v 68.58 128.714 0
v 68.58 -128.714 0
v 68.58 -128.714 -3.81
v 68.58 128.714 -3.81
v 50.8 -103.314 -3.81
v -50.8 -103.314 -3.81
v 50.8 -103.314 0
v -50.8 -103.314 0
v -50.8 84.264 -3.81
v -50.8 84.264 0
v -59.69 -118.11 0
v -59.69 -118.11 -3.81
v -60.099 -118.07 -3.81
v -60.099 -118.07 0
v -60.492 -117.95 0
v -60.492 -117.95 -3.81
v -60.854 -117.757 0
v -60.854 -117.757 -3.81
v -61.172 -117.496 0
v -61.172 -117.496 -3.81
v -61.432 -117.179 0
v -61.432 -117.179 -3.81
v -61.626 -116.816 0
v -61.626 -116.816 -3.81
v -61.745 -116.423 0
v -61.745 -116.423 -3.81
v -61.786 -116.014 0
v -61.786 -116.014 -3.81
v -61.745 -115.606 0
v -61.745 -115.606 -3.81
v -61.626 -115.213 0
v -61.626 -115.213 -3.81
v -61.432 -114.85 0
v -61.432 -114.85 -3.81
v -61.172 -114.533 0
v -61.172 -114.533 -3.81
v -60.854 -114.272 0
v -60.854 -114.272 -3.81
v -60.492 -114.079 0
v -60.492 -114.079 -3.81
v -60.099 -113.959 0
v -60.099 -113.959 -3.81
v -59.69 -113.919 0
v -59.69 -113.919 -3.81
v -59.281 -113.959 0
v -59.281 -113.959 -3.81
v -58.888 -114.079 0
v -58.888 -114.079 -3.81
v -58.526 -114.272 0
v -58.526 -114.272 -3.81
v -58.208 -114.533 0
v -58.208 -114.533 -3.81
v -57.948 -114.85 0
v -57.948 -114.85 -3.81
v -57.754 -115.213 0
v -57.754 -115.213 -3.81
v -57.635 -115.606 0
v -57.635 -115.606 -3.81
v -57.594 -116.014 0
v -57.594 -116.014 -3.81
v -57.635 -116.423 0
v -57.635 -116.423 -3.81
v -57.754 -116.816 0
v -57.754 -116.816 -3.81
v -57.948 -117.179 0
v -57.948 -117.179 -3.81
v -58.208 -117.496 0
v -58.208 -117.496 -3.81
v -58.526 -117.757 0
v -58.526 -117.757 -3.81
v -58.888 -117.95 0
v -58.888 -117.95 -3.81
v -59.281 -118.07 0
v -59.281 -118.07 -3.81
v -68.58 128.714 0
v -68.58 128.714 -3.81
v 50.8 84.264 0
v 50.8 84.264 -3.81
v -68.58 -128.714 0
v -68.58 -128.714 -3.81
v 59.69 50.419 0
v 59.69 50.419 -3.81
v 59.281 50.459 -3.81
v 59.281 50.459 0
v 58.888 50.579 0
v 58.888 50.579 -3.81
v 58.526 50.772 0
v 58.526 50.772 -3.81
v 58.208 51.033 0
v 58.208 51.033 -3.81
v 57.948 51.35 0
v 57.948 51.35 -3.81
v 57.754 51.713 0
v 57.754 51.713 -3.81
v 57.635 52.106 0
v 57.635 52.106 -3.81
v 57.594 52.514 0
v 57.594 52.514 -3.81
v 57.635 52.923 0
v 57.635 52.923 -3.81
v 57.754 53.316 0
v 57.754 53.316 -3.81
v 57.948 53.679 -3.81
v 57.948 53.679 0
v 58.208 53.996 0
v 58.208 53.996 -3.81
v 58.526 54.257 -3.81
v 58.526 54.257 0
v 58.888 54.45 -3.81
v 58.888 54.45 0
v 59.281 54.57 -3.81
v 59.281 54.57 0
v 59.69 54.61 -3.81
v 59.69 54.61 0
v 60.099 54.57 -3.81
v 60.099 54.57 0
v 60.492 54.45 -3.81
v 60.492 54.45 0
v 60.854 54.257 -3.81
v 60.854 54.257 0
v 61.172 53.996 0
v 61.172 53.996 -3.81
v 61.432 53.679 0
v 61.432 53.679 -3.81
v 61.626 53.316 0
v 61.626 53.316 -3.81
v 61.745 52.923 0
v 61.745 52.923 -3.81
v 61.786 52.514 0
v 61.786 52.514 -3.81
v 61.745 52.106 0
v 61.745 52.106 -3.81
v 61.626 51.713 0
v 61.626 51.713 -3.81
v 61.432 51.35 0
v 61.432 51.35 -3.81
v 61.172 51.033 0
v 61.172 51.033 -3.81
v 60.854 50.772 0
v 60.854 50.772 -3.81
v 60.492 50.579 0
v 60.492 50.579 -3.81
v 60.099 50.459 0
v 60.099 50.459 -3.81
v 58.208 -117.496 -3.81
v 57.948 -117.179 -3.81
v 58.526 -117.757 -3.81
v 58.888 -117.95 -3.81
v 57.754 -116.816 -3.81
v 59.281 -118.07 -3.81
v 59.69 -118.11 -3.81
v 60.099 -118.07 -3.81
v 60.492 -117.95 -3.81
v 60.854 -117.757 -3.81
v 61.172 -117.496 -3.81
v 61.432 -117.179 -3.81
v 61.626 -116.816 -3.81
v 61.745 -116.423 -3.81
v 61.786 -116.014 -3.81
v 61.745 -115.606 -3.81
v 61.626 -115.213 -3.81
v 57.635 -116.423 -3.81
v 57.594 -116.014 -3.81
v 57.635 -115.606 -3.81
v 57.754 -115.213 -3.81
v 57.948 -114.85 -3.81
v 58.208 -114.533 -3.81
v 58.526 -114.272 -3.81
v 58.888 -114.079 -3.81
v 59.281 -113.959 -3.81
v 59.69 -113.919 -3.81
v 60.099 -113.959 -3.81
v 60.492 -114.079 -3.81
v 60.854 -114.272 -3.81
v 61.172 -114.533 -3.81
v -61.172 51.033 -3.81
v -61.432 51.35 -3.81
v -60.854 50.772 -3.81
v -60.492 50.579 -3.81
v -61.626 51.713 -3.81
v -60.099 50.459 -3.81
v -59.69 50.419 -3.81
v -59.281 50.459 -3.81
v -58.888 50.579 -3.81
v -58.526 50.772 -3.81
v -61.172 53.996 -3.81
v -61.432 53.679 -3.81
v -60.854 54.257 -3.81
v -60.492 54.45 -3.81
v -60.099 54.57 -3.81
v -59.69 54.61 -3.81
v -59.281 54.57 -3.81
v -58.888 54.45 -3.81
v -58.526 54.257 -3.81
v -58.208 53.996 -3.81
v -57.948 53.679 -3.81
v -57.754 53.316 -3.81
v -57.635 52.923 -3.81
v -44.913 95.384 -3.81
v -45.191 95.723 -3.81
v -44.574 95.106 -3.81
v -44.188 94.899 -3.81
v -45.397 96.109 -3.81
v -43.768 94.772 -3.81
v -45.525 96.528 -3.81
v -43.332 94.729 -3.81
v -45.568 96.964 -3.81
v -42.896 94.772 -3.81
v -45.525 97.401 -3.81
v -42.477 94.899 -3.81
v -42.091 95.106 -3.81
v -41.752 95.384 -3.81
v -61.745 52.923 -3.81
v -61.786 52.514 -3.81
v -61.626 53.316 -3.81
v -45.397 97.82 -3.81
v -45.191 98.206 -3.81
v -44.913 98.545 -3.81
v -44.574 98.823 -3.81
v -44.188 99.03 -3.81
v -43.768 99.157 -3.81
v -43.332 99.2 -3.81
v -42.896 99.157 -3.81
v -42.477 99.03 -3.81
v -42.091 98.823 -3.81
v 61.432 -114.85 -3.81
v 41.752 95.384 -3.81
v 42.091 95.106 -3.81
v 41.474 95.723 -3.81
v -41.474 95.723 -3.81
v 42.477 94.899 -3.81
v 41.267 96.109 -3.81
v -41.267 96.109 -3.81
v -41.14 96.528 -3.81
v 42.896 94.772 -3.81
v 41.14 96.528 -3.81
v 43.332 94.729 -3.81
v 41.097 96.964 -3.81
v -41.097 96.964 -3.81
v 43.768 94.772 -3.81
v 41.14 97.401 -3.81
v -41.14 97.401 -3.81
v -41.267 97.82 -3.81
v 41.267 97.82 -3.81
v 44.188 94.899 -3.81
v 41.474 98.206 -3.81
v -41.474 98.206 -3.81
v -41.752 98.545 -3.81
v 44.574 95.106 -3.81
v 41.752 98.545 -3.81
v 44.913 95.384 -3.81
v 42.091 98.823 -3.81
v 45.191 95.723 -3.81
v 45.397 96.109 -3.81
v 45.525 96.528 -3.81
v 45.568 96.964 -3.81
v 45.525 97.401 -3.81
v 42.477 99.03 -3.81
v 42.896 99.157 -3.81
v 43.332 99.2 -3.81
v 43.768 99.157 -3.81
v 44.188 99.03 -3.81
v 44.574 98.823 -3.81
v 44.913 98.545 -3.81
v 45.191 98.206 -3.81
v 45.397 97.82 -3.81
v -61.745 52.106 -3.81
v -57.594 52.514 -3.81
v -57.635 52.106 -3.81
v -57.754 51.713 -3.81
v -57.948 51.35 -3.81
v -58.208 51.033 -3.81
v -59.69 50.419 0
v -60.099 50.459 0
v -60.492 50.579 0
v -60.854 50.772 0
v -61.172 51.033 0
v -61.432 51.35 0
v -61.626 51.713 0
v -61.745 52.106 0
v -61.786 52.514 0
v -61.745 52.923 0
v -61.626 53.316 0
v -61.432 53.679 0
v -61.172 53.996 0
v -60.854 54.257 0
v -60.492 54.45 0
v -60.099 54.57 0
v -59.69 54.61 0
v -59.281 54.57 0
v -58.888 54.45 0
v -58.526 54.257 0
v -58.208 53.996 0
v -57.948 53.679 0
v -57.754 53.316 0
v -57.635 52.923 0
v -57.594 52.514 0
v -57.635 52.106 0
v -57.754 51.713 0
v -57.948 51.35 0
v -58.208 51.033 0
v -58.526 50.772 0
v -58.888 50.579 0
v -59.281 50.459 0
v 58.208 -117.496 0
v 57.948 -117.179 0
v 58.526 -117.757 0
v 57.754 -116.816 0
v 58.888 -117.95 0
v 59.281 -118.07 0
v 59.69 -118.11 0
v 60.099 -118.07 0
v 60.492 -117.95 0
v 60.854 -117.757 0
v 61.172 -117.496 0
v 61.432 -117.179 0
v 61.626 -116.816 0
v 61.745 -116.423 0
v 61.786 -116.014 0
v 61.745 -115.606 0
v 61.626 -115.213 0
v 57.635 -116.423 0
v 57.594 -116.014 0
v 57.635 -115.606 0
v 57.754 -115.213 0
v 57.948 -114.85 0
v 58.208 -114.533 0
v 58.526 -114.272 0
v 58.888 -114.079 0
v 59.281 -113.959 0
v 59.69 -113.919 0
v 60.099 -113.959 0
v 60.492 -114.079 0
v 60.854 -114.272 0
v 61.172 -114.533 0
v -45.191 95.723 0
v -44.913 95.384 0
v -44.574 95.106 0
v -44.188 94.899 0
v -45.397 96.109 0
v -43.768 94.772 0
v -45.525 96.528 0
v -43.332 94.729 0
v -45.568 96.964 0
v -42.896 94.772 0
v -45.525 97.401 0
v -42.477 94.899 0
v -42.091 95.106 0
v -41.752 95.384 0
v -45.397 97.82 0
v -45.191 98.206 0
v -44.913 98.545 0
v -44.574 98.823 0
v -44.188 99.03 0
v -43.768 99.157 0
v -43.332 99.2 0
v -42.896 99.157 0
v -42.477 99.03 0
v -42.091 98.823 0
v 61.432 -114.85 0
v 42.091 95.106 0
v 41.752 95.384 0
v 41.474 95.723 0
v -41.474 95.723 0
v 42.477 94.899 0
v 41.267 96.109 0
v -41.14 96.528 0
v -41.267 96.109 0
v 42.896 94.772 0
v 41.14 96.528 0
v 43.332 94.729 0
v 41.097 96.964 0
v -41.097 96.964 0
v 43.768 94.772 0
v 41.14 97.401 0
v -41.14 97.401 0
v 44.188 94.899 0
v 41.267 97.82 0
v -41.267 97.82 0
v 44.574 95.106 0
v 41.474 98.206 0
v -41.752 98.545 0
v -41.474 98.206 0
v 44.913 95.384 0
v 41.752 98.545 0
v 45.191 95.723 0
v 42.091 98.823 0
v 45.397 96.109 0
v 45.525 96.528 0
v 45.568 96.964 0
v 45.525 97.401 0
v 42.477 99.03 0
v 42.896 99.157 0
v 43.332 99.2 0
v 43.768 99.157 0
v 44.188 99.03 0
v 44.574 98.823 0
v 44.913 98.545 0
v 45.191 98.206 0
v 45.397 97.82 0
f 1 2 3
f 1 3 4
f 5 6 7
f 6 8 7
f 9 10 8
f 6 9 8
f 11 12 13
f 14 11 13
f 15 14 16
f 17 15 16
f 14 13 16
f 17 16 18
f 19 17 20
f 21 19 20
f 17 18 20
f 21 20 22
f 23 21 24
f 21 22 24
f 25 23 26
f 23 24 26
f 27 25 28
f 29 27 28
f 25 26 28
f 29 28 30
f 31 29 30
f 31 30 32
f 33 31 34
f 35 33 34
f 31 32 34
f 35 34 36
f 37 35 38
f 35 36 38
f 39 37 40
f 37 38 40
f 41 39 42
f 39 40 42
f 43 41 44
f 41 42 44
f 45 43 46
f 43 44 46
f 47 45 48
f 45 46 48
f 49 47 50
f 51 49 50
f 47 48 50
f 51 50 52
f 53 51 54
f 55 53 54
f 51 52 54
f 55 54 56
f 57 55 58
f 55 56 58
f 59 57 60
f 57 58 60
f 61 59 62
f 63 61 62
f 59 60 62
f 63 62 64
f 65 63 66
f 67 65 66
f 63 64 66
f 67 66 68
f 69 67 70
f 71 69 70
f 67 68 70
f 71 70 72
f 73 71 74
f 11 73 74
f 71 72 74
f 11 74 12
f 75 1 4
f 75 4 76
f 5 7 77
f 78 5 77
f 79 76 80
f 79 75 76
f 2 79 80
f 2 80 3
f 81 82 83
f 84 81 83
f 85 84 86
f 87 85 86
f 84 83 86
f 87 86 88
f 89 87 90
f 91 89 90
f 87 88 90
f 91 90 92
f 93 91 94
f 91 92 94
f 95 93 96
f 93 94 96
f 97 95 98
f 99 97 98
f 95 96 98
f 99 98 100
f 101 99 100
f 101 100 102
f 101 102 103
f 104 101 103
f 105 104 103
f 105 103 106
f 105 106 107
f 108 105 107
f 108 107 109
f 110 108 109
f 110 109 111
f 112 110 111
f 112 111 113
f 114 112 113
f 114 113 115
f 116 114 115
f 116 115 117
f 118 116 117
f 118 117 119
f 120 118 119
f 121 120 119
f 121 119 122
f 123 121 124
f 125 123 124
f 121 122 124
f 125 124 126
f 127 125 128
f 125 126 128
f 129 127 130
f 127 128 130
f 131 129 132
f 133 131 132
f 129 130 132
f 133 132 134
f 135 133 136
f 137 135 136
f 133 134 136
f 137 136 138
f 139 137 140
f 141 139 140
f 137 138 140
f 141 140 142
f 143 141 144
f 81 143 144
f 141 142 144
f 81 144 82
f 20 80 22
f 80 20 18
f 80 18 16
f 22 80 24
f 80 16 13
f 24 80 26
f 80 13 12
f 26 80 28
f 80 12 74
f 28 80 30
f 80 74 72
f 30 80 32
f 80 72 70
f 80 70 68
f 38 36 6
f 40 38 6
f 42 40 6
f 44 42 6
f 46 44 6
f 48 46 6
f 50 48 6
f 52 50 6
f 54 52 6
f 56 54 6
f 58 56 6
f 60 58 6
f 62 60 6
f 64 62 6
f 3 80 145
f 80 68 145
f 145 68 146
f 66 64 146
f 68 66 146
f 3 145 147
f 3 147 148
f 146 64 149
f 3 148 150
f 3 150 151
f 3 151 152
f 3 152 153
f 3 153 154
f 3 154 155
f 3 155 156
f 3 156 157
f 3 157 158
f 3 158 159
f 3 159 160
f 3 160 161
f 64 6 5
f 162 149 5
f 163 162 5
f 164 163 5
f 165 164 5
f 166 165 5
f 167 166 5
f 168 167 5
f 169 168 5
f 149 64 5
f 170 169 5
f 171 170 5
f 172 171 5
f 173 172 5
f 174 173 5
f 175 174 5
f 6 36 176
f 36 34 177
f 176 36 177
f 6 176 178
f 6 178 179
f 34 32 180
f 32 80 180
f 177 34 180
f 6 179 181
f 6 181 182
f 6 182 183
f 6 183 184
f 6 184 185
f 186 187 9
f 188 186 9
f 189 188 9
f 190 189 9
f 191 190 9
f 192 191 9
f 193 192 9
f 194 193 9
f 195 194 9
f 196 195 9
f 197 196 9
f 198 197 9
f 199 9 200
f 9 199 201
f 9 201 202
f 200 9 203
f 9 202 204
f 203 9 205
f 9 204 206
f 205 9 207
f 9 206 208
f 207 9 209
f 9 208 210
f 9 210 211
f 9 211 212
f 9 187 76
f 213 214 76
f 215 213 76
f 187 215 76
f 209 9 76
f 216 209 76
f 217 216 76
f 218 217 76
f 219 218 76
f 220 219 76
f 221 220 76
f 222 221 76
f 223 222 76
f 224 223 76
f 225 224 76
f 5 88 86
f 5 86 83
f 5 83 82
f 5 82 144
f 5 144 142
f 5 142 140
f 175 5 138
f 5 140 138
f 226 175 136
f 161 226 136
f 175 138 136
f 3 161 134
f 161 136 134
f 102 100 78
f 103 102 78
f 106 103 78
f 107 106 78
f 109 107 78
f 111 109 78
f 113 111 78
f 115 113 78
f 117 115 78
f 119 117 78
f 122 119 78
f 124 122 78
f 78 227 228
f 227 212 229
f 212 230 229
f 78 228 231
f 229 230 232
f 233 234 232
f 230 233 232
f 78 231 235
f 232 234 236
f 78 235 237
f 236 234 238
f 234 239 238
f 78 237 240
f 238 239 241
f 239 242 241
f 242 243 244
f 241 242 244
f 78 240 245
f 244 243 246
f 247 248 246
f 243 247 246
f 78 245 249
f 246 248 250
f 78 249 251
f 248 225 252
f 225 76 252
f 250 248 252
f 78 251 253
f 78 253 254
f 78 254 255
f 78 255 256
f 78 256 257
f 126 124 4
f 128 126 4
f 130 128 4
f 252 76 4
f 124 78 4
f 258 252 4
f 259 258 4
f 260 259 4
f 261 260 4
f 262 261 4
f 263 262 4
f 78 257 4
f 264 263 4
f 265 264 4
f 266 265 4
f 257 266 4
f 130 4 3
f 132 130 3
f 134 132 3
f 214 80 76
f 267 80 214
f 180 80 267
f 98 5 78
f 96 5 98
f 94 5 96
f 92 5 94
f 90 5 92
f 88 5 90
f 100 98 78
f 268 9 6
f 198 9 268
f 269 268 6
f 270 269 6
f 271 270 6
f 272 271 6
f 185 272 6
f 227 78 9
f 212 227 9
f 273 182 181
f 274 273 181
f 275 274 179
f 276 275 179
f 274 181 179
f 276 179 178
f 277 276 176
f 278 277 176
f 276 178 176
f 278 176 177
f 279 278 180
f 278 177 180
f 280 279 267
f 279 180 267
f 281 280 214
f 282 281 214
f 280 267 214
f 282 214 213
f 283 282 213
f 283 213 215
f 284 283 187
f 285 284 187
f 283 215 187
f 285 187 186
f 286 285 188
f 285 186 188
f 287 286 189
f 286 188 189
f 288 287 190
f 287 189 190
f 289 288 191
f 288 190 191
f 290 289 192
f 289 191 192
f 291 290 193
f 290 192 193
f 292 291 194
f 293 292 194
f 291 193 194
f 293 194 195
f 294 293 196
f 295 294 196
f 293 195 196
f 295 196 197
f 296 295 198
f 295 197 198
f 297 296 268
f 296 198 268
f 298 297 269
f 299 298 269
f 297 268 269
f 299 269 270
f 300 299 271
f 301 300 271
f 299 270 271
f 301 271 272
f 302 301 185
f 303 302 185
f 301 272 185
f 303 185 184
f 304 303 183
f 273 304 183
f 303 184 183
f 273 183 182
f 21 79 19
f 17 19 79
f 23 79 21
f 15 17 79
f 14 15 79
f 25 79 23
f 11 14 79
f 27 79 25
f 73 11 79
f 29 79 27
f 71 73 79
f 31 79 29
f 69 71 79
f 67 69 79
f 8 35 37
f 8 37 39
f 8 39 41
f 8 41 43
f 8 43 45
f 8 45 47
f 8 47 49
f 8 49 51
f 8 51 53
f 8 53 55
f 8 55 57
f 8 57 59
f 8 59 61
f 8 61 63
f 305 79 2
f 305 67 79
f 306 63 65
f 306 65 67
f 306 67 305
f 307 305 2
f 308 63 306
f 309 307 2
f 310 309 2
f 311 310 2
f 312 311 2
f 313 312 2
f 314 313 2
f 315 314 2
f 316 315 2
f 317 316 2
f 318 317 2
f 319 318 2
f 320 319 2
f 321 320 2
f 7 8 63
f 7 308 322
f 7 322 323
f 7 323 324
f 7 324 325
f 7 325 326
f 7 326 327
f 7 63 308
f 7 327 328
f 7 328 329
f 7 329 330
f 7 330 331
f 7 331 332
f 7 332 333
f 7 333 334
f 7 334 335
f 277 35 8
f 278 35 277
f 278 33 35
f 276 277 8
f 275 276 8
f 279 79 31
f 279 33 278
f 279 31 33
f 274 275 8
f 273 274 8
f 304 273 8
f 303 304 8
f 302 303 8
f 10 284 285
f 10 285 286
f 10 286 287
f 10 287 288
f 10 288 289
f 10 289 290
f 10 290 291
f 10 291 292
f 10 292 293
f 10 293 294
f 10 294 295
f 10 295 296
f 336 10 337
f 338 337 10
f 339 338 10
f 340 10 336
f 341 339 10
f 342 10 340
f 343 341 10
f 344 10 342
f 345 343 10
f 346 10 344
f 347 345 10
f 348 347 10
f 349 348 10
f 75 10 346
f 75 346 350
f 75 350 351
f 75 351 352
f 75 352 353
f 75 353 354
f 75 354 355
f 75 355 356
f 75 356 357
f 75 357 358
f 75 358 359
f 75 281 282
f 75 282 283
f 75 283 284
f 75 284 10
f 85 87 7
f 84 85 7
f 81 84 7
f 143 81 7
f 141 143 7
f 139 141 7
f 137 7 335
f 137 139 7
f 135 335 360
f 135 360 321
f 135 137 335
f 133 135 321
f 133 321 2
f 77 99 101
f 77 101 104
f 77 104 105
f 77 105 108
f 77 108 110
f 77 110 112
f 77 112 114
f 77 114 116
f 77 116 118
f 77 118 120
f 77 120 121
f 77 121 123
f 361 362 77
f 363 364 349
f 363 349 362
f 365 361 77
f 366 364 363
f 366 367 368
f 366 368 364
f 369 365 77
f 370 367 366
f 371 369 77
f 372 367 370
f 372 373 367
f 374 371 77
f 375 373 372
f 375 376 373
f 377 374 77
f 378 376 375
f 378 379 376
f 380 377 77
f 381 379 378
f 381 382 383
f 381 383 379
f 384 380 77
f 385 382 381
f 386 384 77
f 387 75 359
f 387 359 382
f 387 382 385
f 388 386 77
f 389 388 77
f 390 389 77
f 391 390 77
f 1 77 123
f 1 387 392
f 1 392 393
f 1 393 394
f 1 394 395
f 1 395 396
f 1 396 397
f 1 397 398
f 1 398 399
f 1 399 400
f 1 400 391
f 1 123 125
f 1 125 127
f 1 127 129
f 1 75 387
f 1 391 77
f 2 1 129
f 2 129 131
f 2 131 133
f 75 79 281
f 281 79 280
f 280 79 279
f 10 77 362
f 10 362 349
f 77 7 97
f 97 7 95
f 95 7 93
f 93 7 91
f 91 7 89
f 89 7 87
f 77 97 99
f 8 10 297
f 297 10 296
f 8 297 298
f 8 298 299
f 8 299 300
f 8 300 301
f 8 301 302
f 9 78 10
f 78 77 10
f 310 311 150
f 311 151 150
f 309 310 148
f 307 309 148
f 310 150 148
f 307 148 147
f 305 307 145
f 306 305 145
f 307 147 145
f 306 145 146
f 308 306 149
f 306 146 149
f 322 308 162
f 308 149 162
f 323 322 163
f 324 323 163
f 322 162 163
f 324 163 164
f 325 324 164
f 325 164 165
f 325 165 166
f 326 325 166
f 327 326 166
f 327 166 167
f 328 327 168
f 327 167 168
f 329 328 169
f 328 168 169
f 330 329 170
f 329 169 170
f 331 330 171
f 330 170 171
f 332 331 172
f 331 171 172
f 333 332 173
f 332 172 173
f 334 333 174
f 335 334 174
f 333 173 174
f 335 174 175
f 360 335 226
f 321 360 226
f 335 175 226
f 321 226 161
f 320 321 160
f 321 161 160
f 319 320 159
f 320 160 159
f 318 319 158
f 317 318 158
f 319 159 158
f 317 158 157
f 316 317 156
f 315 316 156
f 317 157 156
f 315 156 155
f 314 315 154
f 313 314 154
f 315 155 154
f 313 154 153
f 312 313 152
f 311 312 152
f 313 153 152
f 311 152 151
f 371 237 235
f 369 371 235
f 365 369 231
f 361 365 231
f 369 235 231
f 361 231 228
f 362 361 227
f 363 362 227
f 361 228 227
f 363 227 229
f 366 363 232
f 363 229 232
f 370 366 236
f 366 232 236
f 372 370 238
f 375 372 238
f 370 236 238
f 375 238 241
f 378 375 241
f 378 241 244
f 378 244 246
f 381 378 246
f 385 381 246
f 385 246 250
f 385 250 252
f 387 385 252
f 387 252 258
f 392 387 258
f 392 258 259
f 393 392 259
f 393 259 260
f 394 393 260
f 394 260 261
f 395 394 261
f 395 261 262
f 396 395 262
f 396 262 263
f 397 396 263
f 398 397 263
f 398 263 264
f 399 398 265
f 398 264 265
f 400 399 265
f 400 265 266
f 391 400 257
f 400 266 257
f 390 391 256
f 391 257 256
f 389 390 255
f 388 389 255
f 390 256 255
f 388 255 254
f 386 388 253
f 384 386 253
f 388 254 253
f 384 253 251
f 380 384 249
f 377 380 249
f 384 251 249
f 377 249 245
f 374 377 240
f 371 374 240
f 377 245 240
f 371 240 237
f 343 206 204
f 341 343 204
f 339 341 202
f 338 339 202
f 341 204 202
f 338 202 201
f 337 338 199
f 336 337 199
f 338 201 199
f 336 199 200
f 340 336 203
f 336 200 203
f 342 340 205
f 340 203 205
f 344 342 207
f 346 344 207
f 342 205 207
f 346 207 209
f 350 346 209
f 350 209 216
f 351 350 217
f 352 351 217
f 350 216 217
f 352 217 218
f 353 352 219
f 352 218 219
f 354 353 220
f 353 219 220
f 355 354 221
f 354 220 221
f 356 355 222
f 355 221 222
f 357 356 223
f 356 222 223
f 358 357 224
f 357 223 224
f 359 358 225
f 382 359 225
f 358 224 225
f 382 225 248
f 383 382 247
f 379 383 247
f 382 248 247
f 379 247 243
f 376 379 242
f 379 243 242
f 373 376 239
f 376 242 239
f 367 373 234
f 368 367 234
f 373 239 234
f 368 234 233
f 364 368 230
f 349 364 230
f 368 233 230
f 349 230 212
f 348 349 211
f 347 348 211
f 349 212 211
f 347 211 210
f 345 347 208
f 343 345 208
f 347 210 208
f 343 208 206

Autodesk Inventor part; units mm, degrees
ref_plane "YZ Plane" through (0, 0, 0) normal (1, 0, 0) x (0, 1, 0)
ref_plane "XZ Plane" through (0, 0, 0) normal (0, 1, 0) x (-1, 0, 0)
ref_plane "XY Plane" through (0, 0, 0) normal (0, 0, 1) x (1, 0, 0)
sketch "Sketch1" plane through (0, 0, 0) normal (0, 0, 1) x (1, 0, 0)
  line L0 (-68.58, -128.7145) -> (68.58, -128.7145)
  line L1 (68.58, -128.7145) -> (68.58, 128.7145)
  line L2 (68.58, 128.7145) -> (-68.58, 128.7145)
  line L3 (-68.58, 128.7145) -> (-68.58, -128.7145)
  line L4 (-68.58, -128.7145) -> (68.58, 128.7145) construction
  line L5 (68.58, -128.7145) -> (-68.58, 128.7145) construction
  point P0 (0, 0)
  dimension "d0" = 137.16
  dimension "d1" = 257.429
extrude "Extrusion1" add sketch "Sketch1" against normal blind 3.81
sketch "Sketch2" plane through (0, 0, 0) normal (0, 0, 1) x (1, 0, 0)
  circle A0 centre (-59.69, 52.5145) radius 2.0955
  line L0 (-68.58, 128.7145) -> (-68.58, -128.7145) projected
  line L1 (-68.58, 128.7145) -> (68.58, 128.7145) projected
  circle A1 centre (59.69, 52.5145) radius 2.0955
  line L2 (68.58, -128.7145) -> (68.58, 128.7145) projected
  circle A2 centre (-59.69, -116.0145) radius 2.0955
  circle A3 centre (59.69, -116.0145) radius 2.0955
  line L3 (-68.58, -128.7145) -> (68.58, -128.7145) projected
  point P0 (0, 0)
  dimension "d4" = 8.89
  dimension "d5" = 76.2
  dimension "d6" = 76.2
  dimension "d7" = 8.89
  dimension "d8" = 4.191
  dimension "d9" = 12.7
  dimension "d10" = 8.89
  dimension "d11" = 8.89
  dimension "d12" = 12.7
  dimension "d13" = 4.191
  dimension "d21" = 4.191
  dimension "d22" = 4.191
hole "Hole1" at (-59.69, 52.5145, 0) at (59.69, 52.5145, 0) at (-59.69, -116.0145, 0) at (59.69, -116.0145, 0) direction (0, 0, -1) diameter 4.191 end through all
sketch "Sketch5" plane through (0, 0, 0) normal (0, 0, 1) x (1, 0, 0)
  line L0 (-68.58, 128.7145) -> (68.58, 128.7145) projected
  line L1 (68.58, 128.7145) -> (68.58, -128.7145) projected
  point P0 (0, 0)
  point P1 (-43.3324, 96.9645)
  point P2 (43.3324, 96.9645)
  dimension "d37" = 31.75
  dimension "d38" = 86.6648
  dimension "d39" = 31.75
  dimension "d40" = 25.2476
hole "Hole2" at (-43.3324, 96.9645, 0) at (43.3324, 96.9645, 0) direction (0, 0, -1) diameter 4.4704 end through all
sketch "battery_buzzer" plane through (0, 0, 0) normal (0, 0, 1) x (1, 0, 0)
  point P0 (0, 0)
sketch "Sketch7" plane through (0, 0, 0) normal (0, 0, 1) x (1, 0, 0)
  line L0 (-50.8, 39.5798) -> (-50.8, -103.3145)
  line L1 (-50.8, -103.3145) -> (50.8, -103.3145)
  line L2 (50.8, -103.3145) -> (50.8, 39.5798)
  line L3 (50.8, 39.5798) -> (50.8, 84.2645)
  line L4 (50.8, 84.2645) -> (-50.8, 84.2645)
  line L5 (-50.8, 84.2645) -> (-50.8, 39.5798)
  line L6 (68.58, -128.7145) -> (68.58, 128.7145) projected
  line L7 (-68.58, 128.7145) -> (-68.58, -128.7145) projected
  line L8 (68.58, -128.7145) -> (-68.58, -128.7145) projected
  line L9 (68.58, 128.7145) -> (-68.58, 128.7145) projected
  point P0 (0, 0)
  dimension "d48" = 17.78
  dimension "d49" = 17.78
  dimension "d50" = 25.4
  dimension "d51" = 44.45
extrude "Extrusion3" cut sketch "Sketch7" against normal blind 3.81 contours L5 L4 L3 L2 L1 L0
